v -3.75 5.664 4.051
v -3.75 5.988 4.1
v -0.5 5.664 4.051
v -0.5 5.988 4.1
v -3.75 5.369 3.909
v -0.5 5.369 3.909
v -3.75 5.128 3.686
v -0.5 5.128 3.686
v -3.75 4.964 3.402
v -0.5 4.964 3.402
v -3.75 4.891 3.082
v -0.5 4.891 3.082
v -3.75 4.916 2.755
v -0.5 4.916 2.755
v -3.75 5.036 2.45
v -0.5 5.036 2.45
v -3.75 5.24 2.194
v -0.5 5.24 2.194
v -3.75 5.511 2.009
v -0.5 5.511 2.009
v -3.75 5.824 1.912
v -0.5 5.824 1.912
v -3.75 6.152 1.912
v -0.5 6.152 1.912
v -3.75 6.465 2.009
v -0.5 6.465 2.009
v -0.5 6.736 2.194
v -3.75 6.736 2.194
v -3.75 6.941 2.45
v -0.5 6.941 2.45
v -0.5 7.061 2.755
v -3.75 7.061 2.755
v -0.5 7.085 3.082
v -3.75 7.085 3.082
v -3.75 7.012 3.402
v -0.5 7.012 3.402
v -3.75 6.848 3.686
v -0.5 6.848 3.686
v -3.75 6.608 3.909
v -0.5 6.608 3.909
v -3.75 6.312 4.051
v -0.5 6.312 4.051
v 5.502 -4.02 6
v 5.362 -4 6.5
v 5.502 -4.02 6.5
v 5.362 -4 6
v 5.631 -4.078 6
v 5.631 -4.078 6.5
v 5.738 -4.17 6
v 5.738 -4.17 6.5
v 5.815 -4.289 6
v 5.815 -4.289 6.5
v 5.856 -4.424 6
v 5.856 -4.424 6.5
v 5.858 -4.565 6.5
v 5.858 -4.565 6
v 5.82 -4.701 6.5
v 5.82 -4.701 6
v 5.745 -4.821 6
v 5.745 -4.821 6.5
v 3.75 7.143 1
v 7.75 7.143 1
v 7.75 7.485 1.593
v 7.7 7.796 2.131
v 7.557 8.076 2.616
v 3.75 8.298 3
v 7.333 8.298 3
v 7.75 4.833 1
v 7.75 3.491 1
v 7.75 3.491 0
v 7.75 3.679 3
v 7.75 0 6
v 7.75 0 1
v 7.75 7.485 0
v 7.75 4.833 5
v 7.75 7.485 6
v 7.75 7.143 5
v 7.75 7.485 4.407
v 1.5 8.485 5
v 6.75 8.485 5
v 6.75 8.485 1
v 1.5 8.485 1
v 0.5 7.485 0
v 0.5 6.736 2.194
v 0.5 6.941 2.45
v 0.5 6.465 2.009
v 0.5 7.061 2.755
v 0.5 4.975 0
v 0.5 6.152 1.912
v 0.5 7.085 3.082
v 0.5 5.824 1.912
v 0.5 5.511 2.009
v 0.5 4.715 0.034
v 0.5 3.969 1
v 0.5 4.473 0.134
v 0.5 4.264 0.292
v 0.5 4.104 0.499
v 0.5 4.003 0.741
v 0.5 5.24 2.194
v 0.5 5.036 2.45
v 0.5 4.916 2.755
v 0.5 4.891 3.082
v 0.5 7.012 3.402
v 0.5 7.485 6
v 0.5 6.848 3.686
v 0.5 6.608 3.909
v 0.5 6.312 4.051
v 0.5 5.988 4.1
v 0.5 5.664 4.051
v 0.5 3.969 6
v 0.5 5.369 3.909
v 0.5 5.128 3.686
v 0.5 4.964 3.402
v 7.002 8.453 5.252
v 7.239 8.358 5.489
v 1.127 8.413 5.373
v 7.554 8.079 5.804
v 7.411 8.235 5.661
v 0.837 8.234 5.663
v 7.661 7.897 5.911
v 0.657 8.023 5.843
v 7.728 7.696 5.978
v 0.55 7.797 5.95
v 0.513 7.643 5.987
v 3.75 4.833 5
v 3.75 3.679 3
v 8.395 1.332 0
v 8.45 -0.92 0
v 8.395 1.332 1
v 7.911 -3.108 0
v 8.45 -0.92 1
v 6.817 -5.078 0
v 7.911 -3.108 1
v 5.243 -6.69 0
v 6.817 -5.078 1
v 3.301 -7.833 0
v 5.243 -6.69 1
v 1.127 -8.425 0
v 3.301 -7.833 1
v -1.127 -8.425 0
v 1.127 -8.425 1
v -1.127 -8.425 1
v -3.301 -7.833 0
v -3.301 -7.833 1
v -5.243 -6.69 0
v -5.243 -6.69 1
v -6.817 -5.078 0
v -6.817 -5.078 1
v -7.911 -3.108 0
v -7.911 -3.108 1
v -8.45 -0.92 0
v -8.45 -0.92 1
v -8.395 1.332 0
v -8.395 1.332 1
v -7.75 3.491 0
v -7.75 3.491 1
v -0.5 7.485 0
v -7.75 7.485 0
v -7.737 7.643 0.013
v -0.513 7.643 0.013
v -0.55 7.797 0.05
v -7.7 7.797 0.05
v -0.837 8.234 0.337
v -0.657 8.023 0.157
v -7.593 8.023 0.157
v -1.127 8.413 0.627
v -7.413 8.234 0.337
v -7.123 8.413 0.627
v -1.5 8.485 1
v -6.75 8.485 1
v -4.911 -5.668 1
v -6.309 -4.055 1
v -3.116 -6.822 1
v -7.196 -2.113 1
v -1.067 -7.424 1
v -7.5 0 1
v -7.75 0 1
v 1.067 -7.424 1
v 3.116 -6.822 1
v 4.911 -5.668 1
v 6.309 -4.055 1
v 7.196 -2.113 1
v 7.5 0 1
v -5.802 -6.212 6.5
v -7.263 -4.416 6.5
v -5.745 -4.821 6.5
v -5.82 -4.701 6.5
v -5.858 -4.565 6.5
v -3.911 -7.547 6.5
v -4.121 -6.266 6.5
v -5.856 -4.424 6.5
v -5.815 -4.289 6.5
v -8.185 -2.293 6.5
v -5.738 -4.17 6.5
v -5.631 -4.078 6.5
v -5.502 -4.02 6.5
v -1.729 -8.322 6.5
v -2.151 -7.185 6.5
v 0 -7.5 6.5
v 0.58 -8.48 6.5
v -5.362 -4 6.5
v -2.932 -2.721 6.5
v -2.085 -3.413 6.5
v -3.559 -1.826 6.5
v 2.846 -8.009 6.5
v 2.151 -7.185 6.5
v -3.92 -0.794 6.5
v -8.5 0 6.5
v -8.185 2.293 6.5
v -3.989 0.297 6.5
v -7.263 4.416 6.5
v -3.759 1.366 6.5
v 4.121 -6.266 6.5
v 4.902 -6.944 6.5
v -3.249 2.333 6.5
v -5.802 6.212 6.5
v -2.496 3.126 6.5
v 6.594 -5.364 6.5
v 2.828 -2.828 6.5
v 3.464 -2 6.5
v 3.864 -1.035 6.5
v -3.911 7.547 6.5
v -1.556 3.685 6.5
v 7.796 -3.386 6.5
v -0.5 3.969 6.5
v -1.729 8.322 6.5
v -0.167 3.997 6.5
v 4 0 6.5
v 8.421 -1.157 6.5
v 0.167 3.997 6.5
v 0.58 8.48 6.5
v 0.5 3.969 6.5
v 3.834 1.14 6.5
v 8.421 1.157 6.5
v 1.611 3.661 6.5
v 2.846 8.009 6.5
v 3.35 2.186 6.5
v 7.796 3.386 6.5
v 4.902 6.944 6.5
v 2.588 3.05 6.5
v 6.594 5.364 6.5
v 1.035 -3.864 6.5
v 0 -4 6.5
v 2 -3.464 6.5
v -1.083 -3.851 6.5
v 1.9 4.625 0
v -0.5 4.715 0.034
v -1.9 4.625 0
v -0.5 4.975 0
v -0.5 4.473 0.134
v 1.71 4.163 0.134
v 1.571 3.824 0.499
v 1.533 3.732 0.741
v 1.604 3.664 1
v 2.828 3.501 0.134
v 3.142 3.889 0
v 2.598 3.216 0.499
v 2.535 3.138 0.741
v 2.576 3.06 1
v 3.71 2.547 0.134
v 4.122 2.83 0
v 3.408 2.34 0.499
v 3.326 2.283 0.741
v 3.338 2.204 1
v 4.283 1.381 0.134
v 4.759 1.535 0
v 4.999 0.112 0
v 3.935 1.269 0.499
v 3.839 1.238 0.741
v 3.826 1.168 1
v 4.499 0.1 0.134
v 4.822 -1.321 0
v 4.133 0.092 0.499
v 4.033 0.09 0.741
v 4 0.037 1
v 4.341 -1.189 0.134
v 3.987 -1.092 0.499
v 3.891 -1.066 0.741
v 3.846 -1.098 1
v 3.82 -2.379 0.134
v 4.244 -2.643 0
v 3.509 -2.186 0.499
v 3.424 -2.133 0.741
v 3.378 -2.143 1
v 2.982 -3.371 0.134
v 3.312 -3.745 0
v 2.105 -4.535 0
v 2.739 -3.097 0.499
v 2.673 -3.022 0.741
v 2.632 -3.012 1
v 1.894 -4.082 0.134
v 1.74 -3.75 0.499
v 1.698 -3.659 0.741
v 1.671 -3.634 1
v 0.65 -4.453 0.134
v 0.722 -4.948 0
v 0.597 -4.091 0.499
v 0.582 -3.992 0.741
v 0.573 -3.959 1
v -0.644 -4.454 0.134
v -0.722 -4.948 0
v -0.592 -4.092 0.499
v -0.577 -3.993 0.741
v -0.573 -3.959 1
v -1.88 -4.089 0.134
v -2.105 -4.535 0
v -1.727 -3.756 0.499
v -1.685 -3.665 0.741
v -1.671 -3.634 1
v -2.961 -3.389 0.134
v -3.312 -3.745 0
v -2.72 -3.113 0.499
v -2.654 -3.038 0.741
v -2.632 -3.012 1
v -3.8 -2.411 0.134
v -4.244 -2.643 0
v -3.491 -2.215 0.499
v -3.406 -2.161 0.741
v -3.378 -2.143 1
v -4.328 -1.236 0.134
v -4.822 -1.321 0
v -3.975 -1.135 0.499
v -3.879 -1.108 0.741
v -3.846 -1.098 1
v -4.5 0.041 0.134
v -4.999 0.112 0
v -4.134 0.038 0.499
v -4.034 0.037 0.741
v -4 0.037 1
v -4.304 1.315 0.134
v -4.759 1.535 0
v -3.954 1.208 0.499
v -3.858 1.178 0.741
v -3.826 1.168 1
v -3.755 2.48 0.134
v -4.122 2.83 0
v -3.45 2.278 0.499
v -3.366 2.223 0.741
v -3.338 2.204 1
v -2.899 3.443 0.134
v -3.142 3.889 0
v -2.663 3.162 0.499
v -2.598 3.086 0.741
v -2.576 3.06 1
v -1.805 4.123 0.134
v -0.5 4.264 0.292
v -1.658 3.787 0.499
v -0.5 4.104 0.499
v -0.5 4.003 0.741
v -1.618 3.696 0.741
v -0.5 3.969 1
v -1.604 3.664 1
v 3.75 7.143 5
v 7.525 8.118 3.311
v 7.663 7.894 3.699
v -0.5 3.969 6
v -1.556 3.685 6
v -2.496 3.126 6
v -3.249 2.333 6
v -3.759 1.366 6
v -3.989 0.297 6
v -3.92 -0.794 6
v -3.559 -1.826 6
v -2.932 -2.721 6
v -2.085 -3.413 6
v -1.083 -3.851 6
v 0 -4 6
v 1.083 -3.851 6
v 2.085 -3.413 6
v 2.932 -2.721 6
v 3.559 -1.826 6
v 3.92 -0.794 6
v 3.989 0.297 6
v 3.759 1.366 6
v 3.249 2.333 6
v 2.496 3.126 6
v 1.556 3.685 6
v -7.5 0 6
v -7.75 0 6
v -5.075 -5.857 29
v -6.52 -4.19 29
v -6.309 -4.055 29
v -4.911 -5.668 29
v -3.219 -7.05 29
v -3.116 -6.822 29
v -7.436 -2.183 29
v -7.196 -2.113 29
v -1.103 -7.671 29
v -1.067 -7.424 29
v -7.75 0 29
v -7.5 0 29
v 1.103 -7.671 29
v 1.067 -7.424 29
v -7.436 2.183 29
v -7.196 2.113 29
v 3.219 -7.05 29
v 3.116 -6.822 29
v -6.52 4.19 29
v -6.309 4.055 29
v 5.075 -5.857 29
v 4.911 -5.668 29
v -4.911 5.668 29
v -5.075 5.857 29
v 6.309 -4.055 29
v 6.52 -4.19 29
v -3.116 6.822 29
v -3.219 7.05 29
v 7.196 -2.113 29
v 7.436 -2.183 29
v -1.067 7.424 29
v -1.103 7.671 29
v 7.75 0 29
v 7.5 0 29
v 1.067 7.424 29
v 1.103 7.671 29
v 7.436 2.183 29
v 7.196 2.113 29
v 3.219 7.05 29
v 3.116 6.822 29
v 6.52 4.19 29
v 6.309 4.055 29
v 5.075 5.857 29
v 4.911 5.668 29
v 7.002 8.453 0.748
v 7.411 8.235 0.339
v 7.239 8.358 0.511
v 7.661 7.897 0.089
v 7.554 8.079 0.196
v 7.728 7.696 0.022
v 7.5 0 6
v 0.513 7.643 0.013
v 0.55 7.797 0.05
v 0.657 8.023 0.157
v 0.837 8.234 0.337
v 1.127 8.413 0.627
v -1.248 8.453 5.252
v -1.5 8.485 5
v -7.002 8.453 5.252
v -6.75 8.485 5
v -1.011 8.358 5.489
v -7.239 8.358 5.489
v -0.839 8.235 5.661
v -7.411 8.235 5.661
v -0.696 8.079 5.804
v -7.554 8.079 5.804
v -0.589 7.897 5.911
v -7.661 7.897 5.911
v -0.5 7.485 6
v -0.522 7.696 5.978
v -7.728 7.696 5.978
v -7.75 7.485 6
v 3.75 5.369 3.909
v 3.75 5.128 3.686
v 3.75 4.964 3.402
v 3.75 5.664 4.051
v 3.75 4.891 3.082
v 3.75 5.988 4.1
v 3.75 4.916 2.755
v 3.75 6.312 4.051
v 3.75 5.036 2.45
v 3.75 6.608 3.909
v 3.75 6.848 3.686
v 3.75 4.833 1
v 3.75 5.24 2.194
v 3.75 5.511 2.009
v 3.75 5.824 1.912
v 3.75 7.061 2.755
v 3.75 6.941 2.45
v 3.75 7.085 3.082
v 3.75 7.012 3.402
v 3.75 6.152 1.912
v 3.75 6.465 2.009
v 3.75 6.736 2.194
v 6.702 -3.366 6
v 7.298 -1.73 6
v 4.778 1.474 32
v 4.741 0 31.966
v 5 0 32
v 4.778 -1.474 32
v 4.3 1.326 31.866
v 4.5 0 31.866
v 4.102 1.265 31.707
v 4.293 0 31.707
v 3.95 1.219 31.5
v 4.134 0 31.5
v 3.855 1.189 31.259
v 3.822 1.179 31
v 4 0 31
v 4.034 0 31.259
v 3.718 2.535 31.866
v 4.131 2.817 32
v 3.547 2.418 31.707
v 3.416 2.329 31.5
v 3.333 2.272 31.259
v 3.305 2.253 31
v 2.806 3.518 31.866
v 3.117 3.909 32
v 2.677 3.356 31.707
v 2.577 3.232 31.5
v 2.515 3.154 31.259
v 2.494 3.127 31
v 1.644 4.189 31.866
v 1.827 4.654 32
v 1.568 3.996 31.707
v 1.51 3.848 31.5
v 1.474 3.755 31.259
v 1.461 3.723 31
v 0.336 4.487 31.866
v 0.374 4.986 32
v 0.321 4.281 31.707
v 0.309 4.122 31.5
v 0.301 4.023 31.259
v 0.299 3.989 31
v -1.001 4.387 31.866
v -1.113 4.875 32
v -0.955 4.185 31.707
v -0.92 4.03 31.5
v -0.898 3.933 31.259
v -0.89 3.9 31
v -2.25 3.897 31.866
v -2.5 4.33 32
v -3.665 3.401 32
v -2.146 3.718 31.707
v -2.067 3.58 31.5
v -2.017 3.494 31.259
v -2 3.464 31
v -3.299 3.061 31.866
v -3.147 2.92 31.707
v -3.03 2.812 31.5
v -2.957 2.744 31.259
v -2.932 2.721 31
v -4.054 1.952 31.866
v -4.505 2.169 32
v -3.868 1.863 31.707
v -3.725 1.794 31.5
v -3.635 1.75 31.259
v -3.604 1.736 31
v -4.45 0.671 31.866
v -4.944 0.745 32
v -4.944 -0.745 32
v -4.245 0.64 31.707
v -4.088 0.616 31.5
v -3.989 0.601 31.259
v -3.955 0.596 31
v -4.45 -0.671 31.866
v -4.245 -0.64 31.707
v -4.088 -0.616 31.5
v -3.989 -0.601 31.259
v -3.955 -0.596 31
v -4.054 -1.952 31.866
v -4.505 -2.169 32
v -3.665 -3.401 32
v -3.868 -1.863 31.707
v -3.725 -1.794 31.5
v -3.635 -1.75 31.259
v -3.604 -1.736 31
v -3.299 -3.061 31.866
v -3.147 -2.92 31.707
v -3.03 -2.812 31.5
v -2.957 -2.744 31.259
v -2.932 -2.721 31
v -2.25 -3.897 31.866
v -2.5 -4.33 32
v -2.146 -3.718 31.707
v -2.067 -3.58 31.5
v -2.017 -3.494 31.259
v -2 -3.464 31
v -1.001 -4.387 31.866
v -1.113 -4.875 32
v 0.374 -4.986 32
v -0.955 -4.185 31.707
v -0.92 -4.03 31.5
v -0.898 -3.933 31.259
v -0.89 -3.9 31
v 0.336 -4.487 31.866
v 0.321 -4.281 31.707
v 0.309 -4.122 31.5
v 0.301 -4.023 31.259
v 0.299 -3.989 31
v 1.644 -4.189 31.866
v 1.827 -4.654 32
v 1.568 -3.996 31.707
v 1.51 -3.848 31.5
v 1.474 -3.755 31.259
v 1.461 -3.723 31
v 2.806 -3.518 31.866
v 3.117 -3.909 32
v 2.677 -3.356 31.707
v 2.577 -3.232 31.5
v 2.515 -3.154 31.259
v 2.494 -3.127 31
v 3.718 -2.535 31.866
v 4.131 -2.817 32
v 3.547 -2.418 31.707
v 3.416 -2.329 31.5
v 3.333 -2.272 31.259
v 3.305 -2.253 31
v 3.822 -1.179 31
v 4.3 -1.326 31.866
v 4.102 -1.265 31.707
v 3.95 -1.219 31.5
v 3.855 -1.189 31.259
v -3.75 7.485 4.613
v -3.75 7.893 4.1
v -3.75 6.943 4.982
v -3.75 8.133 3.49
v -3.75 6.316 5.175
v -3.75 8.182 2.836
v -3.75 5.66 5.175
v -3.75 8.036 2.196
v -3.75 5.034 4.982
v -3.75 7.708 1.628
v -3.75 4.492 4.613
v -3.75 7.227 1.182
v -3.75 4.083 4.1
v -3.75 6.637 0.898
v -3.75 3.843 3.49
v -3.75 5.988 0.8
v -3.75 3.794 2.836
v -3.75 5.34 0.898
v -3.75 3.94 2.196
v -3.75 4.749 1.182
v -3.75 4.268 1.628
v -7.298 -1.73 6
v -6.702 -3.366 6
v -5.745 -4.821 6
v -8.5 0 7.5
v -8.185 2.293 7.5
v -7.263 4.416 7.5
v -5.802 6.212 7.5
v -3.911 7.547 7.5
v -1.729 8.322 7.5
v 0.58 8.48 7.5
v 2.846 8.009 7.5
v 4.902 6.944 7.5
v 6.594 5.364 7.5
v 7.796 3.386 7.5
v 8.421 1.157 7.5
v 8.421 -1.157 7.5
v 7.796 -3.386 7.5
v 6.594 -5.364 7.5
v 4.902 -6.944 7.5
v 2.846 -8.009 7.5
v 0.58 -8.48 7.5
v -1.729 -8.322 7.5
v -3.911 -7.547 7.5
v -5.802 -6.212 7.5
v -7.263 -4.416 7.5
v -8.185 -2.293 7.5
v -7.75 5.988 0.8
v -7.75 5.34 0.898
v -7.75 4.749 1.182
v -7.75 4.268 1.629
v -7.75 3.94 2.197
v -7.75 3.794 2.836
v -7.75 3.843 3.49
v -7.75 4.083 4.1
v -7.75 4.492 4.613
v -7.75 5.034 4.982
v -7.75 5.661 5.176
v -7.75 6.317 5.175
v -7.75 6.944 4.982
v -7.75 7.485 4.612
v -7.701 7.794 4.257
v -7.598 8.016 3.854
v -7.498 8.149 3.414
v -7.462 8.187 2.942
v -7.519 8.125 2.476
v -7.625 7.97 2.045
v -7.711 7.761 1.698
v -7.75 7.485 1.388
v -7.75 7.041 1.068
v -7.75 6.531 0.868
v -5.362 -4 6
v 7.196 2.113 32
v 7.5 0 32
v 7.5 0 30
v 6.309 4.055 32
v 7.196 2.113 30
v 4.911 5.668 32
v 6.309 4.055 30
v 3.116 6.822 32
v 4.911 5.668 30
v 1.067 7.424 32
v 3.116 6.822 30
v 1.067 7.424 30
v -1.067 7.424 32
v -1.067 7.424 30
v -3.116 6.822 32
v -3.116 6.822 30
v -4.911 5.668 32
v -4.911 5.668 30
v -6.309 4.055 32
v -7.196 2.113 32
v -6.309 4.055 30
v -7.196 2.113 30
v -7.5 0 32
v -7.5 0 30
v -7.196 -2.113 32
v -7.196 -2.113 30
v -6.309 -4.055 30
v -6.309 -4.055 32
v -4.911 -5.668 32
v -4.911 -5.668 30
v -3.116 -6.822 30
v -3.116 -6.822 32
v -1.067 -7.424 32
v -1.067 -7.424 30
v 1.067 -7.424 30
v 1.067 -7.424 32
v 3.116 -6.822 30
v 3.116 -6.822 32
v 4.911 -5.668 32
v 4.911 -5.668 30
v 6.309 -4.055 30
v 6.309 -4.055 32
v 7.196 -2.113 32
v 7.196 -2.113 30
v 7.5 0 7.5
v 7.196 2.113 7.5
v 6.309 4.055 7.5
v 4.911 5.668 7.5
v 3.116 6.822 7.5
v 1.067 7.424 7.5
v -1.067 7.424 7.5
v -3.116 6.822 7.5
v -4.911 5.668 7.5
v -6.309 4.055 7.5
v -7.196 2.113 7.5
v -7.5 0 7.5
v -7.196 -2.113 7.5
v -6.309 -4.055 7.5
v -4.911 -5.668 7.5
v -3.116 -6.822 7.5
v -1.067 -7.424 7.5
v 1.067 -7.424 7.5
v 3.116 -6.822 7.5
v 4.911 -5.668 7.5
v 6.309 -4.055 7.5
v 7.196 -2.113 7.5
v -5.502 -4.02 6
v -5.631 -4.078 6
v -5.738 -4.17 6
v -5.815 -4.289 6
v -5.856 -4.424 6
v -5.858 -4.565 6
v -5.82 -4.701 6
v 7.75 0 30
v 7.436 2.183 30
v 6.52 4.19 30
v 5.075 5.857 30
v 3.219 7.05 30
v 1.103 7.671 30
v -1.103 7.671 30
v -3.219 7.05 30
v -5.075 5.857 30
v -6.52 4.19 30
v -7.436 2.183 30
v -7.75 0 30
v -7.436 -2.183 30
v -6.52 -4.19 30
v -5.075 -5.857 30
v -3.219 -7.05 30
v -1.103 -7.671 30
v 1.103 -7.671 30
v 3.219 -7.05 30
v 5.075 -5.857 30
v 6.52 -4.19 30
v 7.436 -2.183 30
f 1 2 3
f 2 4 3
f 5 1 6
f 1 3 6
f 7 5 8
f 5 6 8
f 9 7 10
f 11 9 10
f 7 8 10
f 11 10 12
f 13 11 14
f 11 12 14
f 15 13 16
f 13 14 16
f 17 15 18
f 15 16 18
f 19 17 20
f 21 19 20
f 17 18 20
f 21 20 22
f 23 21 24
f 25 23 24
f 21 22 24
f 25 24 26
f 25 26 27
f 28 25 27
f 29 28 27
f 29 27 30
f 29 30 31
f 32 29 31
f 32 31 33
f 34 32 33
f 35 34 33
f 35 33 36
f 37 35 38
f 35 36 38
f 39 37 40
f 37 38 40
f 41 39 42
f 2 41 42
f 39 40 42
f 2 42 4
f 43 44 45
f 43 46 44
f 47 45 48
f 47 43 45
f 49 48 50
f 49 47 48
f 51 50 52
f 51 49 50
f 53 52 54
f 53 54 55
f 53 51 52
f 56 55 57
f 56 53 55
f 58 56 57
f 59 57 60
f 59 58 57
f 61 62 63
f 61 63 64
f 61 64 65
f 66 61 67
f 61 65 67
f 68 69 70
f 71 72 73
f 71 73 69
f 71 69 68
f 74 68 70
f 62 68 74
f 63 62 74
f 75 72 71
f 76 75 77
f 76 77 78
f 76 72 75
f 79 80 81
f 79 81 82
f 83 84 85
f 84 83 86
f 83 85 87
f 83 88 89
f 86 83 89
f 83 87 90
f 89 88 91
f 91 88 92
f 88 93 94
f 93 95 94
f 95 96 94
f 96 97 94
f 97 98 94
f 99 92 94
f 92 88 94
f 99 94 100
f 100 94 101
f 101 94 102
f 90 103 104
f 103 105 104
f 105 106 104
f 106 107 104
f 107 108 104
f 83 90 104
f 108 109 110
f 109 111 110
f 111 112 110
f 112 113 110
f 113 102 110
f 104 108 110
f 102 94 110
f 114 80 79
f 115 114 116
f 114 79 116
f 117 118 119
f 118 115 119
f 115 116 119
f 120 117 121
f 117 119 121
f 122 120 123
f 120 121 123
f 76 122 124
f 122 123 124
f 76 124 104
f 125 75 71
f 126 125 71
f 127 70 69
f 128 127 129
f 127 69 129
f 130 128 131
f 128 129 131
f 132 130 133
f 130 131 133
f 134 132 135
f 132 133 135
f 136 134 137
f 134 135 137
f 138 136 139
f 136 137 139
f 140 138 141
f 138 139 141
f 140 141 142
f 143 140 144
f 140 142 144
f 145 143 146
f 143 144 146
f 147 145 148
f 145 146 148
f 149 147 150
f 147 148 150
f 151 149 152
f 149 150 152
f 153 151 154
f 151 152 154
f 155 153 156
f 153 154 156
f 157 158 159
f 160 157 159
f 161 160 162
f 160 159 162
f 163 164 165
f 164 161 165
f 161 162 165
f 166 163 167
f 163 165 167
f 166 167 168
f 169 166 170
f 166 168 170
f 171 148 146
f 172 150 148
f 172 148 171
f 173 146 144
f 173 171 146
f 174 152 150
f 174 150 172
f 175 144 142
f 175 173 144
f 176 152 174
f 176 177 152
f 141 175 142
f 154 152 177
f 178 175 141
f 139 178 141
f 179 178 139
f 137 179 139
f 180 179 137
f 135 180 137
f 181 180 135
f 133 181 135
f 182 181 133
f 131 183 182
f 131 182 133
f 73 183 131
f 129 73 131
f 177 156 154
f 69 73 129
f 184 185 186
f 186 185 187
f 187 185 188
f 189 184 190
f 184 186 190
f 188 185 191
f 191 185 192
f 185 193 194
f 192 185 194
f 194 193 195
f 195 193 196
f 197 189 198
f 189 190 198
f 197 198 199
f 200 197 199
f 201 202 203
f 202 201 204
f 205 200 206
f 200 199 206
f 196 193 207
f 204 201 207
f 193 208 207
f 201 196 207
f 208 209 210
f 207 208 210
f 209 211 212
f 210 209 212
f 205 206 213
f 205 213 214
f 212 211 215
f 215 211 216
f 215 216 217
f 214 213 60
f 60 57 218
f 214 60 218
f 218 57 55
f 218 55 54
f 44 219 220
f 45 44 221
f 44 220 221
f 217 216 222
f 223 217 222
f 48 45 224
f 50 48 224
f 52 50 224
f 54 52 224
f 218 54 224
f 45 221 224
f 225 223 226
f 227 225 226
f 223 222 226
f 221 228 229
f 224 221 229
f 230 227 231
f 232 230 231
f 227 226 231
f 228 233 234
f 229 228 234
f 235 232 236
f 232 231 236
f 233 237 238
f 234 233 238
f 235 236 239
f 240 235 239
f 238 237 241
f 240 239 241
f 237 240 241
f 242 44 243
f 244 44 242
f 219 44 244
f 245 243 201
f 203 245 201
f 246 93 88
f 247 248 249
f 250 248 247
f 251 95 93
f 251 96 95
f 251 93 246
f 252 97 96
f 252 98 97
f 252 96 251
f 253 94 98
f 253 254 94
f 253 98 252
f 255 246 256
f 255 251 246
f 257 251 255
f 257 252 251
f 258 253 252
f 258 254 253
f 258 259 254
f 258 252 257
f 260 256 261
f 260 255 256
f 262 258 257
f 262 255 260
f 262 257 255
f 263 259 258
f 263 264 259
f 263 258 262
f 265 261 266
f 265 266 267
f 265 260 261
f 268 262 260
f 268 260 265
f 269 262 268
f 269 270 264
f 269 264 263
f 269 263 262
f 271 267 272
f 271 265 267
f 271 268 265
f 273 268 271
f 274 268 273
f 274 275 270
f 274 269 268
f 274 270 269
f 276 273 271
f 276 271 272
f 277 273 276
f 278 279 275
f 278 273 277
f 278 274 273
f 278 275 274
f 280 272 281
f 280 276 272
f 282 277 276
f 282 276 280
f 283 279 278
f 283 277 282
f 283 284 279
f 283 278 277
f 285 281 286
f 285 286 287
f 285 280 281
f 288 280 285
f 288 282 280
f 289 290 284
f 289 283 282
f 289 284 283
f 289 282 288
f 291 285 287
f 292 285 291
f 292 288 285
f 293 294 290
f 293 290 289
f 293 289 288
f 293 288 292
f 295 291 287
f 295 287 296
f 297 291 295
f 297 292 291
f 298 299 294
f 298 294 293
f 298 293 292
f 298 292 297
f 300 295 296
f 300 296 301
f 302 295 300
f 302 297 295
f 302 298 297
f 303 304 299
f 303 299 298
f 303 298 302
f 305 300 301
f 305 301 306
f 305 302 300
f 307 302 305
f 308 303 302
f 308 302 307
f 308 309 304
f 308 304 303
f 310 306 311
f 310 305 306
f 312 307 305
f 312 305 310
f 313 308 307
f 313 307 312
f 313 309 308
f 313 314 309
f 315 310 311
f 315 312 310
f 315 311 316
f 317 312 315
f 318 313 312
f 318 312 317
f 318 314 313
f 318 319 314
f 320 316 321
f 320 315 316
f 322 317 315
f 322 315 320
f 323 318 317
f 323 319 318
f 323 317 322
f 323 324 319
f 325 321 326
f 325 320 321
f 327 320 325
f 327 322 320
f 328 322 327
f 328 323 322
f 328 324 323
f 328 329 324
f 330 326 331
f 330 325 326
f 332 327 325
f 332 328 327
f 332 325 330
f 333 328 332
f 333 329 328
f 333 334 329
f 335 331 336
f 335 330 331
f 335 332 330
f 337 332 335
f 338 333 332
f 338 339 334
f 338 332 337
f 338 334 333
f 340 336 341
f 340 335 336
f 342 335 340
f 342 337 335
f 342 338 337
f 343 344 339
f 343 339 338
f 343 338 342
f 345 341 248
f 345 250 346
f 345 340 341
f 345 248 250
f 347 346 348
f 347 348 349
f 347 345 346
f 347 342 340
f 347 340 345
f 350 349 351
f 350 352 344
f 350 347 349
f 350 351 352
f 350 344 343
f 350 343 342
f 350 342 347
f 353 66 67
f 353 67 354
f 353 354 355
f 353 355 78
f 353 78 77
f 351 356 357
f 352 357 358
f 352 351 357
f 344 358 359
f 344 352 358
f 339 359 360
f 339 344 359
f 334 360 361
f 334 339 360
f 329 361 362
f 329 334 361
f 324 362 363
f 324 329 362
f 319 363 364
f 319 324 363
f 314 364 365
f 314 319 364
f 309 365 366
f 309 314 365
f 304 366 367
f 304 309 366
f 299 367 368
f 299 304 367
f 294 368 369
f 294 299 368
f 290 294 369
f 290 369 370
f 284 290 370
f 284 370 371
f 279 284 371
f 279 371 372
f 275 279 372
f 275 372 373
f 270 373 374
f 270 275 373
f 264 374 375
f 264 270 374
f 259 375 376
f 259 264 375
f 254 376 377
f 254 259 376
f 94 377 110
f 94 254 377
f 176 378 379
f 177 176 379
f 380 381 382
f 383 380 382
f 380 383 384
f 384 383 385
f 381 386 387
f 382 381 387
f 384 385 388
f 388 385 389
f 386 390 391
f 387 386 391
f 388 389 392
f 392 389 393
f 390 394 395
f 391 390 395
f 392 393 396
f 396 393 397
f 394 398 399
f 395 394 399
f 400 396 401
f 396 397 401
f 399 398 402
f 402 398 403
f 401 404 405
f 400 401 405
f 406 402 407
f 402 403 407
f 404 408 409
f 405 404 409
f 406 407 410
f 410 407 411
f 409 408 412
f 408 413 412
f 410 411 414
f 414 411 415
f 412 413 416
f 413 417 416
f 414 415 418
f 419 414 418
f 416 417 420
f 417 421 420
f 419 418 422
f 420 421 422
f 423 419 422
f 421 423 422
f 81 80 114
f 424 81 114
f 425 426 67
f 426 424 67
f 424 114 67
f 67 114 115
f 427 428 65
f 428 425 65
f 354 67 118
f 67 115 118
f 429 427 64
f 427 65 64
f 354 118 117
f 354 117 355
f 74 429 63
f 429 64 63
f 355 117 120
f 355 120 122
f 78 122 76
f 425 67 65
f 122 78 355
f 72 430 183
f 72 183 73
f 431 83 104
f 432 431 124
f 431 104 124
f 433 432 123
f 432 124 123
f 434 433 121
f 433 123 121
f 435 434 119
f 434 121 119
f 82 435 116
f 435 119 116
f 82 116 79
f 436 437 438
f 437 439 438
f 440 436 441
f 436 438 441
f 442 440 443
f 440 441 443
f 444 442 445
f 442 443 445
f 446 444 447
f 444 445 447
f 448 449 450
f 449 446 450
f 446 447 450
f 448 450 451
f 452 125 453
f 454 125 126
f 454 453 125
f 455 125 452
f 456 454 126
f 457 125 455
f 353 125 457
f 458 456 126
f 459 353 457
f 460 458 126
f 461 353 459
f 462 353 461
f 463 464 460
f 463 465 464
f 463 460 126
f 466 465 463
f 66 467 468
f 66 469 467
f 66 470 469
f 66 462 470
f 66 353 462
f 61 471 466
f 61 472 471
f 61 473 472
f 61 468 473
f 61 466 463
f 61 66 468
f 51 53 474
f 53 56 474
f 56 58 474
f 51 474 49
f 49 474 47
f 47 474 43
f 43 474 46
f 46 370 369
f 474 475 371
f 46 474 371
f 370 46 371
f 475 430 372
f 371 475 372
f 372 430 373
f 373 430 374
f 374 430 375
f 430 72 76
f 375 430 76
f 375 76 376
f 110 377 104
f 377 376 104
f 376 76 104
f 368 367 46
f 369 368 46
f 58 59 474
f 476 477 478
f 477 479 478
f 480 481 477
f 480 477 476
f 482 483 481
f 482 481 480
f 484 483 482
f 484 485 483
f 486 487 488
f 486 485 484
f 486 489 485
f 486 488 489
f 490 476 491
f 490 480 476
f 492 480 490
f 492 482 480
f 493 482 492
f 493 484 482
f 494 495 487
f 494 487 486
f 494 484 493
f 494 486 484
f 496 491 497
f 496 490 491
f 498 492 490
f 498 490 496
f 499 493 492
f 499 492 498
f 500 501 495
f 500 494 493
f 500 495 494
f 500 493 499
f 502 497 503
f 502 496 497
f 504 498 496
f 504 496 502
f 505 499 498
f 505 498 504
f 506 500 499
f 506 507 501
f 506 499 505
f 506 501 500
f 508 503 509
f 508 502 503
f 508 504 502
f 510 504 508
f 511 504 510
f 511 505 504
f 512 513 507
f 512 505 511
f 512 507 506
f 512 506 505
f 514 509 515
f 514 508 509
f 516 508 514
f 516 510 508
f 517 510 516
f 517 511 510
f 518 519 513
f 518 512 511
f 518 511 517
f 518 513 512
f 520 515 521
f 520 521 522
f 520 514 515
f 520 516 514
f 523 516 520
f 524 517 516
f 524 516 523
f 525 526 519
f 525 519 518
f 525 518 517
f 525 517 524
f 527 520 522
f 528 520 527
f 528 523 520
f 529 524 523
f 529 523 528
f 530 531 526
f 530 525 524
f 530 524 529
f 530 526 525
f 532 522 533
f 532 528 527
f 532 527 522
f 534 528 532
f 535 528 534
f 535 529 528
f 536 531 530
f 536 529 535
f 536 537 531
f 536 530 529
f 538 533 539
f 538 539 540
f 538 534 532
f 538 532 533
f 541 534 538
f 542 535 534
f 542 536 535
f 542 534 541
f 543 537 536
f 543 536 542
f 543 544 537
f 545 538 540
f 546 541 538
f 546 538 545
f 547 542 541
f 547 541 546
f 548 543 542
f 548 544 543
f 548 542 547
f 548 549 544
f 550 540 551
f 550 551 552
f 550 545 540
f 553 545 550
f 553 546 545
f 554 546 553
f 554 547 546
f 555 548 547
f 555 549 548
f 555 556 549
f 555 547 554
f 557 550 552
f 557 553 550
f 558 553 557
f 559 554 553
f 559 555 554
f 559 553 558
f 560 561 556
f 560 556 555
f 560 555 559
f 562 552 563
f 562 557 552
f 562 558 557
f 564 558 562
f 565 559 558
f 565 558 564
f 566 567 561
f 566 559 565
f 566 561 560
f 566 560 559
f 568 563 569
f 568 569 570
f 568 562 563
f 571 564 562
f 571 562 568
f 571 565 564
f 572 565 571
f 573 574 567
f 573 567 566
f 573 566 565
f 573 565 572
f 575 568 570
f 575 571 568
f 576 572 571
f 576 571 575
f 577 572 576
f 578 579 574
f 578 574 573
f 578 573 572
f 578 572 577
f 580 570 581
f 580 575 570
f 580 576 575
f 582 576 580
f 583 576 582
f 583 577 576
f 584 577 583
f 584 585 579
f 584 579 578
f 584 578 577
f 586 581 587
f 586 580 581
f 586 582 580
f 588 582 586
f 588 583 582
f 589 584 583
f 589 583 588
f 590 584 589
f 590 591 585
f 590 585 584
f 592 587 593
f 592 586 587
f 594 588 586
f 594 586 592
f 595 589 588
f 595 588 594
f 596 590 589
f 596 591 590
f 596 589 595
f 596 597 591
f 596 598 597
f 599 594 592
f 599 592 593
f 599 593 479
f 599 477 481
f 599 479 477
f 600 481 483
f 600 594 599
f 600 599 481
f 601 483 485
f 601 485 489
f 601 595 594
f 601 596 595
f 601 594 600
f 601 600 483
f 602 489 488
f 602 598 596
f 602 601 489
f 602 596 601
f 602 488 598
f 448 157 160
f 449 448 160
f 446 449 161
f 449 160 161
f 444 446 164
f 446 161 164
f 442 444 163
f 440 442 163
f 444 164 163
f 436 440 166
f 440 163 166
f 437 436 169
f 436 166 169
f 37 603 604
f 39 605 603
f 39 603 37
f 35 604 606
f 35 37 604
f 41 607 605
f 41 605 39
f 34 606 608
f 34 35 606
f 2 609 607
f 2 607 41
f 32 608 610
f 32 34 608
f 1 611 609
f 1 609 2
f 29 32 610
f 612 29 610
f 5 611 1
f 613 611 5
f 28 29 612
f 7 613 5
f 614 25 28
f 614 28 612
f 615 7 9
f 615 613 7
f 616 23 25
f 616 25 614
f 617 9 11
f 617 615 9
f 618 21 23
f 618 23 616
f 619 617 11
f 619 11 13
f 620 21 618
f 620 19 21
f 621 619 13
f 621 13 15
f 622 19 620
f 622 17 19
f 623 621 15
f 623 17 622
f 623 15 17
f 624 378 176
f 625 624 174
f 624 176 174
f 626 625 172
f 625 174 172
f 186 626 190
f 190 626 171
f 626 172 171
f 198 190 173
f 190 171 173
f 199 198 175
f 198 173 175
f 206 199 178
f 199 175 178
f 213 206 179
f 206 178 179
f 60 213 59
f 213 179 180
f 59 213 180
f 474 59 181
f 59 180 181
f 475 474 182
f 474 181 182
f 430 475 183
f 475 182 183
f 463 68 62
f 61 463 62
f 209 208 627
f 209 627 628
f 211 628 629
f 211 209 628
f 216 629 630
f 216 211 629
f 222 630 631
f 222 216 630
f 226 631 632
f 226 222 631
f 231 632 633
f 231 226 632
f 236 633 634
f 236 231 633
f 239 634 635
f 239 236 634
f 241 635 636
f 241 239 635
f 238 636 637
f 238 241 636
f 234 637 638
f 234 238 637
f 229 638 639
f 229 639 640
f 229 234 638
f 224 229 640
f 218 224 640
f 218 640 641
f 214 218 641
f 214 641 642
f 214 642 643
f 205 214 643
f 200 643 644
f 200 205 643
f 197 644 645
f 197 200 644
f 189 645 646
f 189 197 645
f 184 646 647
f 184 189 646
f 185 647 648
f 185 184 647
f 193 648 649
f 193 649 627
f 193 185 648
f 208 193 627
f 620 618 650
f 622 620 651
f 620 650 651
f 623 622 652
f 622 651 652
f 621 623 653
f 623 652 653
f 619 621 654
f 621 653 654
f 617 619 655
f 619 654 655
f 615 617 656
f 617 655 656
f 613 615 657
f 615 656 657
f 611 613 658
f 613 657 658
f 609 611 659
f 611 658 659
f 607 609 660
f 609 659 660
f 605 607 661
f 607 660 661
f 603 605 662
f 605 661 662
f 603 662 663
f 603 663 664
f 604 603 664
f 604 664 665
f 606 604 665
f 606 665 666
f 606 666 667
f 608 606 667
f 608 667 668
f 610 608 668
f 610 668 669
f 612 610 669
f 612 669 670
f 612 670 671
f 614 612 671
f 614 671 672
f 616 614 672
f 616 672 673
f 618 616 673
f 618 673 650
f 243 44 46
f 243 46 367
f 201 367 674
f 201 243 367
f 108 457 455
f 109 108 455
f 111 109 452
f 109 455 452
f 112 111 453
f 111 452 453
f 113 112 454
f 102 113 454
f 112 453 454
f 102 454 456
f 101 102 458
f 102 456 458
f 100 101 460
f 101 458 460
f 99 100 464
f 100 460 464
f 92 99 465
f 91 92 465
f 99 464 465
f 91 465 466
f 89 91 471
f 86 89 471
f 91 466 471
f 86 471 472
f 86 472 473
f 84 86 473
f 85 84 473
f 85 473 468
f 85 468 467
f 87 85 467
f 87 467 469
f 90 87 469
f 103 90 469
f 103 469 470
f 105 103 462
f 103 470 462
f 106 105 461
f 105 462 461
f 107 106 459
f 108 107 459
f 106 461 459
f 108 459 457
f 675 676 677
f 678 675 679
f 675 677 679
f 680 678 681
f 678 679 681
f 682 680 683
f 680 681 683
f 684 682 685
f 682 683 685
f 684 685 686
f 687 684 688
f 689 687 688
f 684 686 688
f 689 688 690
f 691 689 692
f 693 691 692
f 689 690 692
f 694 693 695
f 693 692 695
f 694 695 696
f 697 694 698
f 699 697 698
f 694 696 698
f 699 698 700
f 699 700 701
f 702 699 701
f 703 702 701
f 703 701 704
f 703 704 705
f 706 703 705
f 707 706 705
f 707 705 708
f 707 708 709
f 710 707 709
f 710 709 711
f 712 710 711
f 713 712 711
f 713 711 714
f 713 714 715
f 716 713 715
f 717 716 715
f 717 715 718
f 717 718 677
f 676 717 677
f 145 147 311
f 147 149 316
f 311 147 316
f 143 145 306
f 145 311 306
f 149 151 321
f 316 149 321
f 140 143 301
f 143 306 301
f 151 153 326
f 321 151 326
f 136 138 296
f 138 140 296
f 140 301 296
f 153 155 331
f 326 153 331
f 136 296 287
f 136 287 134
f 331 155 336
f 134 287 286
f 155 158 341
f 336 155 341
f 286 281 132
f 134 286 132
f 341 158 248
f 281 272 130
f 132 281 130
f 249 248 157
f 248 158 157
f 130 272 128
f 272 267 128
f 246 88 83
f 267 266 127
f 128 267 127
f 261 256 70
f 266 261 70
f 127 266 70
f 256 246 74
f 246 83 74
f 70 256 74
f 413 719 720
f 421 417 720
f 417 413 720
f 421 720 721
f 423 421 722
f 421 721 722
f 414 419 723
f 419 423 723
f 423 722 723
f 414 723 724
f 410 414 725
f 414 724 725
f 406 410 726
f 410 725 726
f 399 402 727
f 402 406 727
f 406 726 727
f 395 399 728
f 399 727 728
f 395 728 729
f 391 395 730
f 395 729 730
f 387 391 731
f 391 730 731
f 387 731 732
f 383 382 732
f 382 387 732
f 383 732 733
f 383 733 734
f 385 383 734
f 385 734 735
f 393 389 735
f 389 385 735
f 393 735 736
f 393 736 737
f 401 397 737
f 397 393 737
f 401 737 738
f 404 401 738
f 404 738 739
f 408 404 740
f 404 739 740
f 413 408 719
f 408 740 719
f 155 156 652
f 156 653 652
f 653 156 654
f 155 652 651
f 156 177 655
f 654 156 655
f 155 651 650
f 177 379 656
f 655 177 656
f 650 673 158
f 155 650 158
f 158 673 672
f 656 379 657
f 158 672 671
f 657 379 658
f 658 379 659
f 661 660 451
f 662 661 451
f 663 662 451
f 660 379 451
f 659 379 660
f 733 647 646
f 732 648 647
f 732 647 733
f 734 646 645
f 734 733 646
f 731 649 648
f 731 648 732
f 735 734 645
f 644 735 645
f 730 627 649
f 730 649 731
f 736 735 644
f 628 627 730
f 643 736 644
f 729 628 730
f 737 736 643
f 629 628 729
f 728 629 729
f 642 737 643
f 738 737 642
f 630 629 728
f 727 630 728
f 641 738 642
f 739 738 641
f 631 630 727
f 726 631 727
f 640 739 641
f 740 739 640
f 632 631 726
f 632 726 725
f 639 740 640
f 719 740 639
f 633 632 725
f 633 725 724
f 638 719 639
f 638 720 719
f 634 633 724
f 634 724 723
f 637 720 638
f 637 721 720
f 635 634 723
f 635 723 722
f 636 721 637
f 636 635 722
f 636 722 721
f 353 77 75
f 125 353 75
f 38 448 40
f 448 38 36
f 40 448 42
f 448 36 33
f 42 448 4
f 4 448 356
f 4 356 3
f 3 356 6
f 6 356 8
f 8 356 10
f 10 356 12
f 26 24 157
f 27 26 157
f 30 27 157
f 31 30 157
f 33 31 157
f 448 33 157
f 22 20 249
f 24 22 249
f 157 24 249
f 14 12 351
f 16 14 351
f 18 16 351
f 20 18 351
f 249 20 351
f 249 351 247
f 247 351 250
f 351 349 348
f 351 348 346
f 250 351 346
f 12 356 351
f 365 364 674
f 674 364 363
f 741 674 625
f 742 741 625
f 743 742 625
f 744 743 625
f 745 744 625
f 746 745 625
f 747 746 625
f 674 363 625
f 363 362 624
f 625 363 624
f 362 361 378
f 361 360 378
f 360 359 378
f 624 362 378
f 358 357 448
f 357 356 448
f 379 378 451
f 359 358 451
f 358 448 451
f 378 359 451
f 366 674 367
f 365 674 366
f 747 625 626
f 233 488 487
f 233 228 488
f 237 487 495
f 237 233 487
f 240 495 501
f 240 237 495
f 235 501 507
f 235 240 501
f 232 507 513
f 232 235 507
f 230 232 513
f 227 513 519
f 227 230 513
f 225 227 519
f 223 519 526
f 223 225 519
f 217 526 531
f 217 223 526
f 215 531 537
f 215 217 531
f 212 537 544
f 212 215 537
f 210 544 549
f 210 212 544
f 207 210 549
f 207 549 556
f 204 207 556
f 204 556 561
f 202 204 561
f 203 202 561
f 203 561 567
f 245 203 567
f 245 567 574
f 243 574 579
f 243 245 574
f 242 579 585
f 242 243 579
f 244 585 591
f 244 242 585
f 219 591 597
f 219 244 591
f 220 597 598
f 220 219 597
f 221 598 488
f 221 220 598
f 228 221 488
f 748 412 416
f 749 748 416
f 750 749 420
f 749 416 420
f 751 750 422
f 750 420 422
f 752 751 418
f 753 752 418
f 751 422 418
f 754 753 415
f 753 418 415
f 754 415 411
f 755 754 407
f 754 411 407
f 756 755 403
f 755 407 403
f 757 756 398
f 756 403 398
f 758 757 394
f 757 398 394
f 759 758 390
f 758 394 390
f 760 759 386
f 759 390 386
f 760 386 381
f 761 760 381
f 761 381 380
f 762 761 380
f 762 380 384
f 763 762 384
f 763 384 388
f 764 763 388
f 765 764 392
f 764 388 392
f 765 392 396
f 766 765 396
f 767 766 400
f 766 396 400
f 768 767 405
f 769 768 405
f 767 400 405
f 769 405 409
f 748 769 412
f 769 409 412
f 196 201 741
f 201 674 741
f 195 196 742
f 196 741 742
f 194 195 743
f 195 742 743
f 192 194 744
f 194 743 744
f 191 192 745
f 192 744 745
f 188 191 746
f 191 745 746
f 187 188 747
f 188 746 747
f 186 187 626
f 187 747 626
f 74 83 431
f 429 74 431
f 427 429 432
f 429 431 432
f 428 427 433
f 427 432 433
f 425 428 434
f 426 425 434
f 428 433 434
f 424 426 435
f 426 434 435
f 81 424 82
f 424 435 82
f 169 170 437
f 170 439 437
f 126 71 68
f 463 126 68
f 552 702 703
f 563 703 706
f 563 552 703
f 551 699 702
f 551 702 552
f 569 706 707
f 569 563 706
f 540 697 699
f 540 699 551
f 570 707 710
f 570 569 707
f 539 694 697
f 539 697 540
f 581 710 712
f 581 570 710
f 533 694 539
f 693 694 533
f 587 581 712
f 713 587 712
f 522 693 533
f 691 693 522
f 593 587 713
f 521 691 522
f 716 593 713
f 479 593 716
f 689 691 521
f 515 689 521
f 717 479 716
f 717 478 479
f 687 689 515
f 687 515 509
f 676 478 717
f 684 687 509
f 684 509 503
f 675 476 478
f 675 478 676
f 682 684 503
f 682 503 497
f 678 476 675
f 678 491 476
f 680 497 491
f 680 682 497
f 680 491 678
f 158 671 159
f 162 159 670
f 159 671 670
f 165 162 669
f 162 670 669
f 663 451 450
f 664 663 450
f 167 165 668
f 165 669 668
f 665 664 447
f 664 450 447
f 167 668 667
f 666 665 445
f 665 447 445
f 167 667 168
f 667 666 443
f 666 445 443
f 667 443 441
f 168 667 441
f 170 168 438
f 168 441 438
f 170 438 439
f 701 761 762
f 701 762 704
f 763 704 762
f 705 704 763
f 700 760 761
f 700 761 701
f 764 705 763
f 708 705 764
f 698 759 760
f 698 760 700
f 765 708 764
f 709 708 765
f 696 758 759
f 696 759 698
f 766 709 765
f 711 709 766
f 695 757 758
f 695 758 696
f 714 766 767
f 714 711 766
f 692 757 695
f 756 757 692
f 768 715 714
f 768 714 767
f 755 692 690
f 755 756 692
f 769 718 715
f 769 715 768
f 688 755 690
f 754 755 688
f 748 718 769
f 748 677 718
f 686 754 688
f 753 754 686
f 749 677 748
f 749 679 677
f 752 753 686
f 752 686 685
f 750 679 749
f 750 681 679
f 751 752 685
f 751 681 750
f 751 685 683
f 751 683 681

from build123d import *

# Parameters (mm, degrees)
SKETCH1_R                      = 7.5
SKETCH1_R_2                    = 4
BOSS_EXTRUDE1_DEPTH            = 32
SKETCH6_W                      = 1
SKETCH6_H                      = 1
SKETCH7_W                      = 1
SKETCH7_H                      = 1
CUT_EXTRUDE1_DEPTH             = 35.18332927
BOSS_EXTRUDE3_DEPTH            = 6.5
SKETCH15_W                     = 15.5
SKETCH15_H                     = 12.485281374
CUT_EXTRUDE2_DEPTH             = 0.5
CBORE_FOR_M2_SHCS1_D           = 2.2
CBORE_FOR_M2_SHCS1_CBORE_D     = 4.4
CBORE_FOR_M2_SHCS1_CBORE_DEPTH = 4
FILLET4_R                      = 0.5
SKETCH4_R                      = 7.75
SKETCH4_R_2                    = 4
BOSS_EXTRUDE4_DEPTH            = 1
CUT_EXTRUDE3_DEPTH             = 4
FILLET5_R                      = 1


with BuildPart() as part:
    # Sketch1 → Boss-Extrude1 (new body)
    with BuildSketch(Plane.XY):
        Circle(SKETCH1_R)
        Circle(SKETCH1_R_2, mode=Mode.SUBTRACT)
    extrude(amount=BOSS_EXTRUDE1_DEPTH)

    # Sketch6 → Revolve1 (revolve)
    with BuildSketch(Plane(origin=(0, 0, 0), x_dir=(-1, 0, 0), z_dir=(0, 1, 0))):
        with Locations((8, 0.5)):
            Rectangle(SKETCH6_W, SKETCH6_H)
    revolve(axis=Axis((0, 0, 32), (0, 0, -1)))

    # Sketch7 → Revolve2 (revolve)
    with BuildSketch(Plane(origin=(0, 0, 0), x_dir=(0, 0, -1), z_dir=(1, 0, 0)), mode=Mode.PRIVATE) as revolve2_sk:
        with Locations((-7, 8)):
            Rectangle(SKETCH7_W, SKETCH7_H)
    revolve(revolve2_sk.sketch.rotate(Axis((0, 0, 32), (0, 0, -1)), 270), axis=Axis((0, 0, 32), (0, 0, -1)))

    # Sketch9 → Cut-Extrude1 (cut, through all)
    with BuildSketch(Plane(origin=(0, 0, 0), x_dir=(-1, 0, 0), z_dir=(0, 1, 0))):
        Polygon((0, 0), (-0.5, 0), (-0.5, 6.5), (0.5, 6.5), (0.5, 0), align=None)
    extrude(amount=CUT_EXTRUDE1_DEPTH, mode=Mode.SUBTRACT)

    # Sketch12 → Boss-Extrude3 (add)
    with BuildSketch(Plane(origin=(0, 0, 6.5), x_dir=(-1, 0, 0), z_dir=(0, 0, -1))):
        with BuildLine():
            Line((4, 0), (7.75, 0))
            Line((7.75, 0), (7.75, 8.485281374))
            Line((7.75, 8.485281374), (0.5, 8.485281374))
            Line((0.5, 8.485281374), (0.5, 3.968626967))
            ThreePointArc((0.5, 3.968626967), (3, 2.645751311), (4, 0))
        make_face()
        with BuildLine():
            Line((-7.75, 0), (-7.75, 8.485281374))
            Line((-7.75, 8.485281374), (-0.5, 8.485281374))
            Line((-0.5, 8.485281374), (-0.5, 3.968626967))
            ThreePointArc((-0.5, 3.968626967), (-3, 2.645751311), (-4, 0))
            Line((-4, 0), (-7.75, 0))
        make_face()
    extrude(amount=BOSS_EXTRUDE3_DEPTH)

    # Sketch15 → Cut-Extrude2 (cut)
    with BuildSketch(Plane(origin=(0, 0, 6.5), x_dir=(-1, 0, 0), z_dir=(0, 0, -1))):
        with Locations((0, 2.242640687)):
            Rectangle(SKETCH15_W, SKETCH15_H)
    extrude(amount=CUT_EXTRUDE2_DEPTH, mode=Mode.SUBTRACT)

    # CBORE for M2 SHCS1 (through all)
    with Locations(Plane(origin=(-7.75, 5.988170693, 3), x_dir=(0, 0, -1), z_dir=(-1, 0, 0))):
        with Locations((0, 0)):
            CounterBoreHole(CBORE_FOR_M2_SHCS1_D / 2, CBORE_FOR_M2_SHCS1_CBORE_D / 2, CBORE_FOR_M2_SHCS1_CBORE_DEPTH)

    # Fillet4
    fillet4_edges = [part.edges().sort_by_distance(p)[0] for p in [
        (-6.34428877, -4, 6.25),
        (6.34428877, -4, 6.25),
    ]]
    fillet(fillet4_edges, radius=FILLET4_R)

    # Sketch4 → Boss-Extrude4 (add)
    with BuildSketch(Plane.XY.offset(29)):
        Circle(SKETCH4_R)
        with Locations(Location((0, 0, 0), (0, 0, 270))):
            Circle(SKETCH4_R_2, mode=Mode.SUBTRACT)
    extrude(amount=BOSS_EXTRUDE4_DEPTH)

    # Sketch16 → Cut-Extrude3 (cut)
    with BuildSketch(Plane(origin=(7.75, 0, 0), x_dir=(0, 0, -1), z_dir=(1, 0, 0))):
        Polygon((-3, 8.297571769), (-5, 7.142871231), (-5, 4.833470154), (-3, 3.678769616), (-1, 4.833470154), (-1, 7.142871231), align=None)
    extrude(amount=-CUT_EXTRUDE3_DEPTH, mode=Mode.SUBTRACT)

    # Fillet5
    # the kernel refuses this fillet: 1 mm, written as the material it takes off along each edge
    with BuildSketch(Plane(origin=(0.5, 8.485281374, 6), x_dir=(0, -1, 0), z_dir=(0, 0, -1))) as fillet5_piece_1:
        with BuildLine():
            CenterArc((FILLET5_R, -FILLET5_R), FILLET5_R, 90, 90)
            Line((0, -FILLET5_R), (0, 0))
            Line((0, 0), (FILLET5_R, 0))
        make_face()
    extrude(amount=8.5, mode=Mode.SUBTRACT)
    with BuildSketch(Plane(origin=(-2, 8.485281374, 6), x_dir=(0, -1, 0), z_dir=(1, 0, 0)), Plane(origin=(-10.25, 8.485281374, 6), x_dir=(0, -1, 0), z_dir=(1, 0, 0)), Plane(origin=(-10.25, 8.485281374, 0), x_dir=(0, 0, 1), z_dir=(1, 0, 0))) as fillet5_piece_2:
        with BuildLine():
            CenterArc((FILLET5_R, FILLET5_R), FILLET5_R, 180, 90)
            Line((0, FILLET5_R), (0, 0))
            Line((0, 0), (FILLET5_R, 0))
        make_face()
    extrude(amount=12.25, mode=Mode.SUBTRACT)
    with BuildSketch(Plane(origin=(0, 0, 0), x_dir=(0.0031415874858760906, 0.9999950652018582, 0), z_dir=(-0.9999950652018582, 0.0031415874858760906, 0))) as fillet5_piece_3:
        with BuildLine():
            CenterArc((4 + FILLET5_R, -FILLET5_R), FILLET5_R, 90, 90)
            Line((4 + FILLET5_R, 0), (4, 0))
            Line((4, 0), (4, -FILLET5_R))
        make_face()
    revolve(axis=Axis((0, 0, 0), (0, 0, -1)), revolution_arc=359.64, mode=Mode.SUBTRACT)
    with BuildSketch(Plane(origin=(-0.5, 8.485281374, -2.5), x_dir=(-1, 0, 0), z_dir=(0, 0, 1))) as fillet5_piece_4:
        with BuildLine():
            CenterArc((FILLET5_R, FILLET5_R), FILLET5_R, 180, 90)
            Line((0, FILLET5_R), (0, 0))
            Line((0, 0), (FILLET5_R, 0))
        make_face()
    extrude(amount=8.5, mode=Mode.SUBTRACT)
    with BuildSketch(Plane(origin=(0, 0, 32), x_dir=(1, 0, 0), z_dir=(0, -1, 0))) as fillet5_piece_5:
        with BuildLine():
            CenterArc((4 + FILLET5_R, -FILLET5_R), FILLET5_R, 90, 90)
            Line((4 + FILLET5_R, 0), (4, 0))
            Line((4, 0), (4, -FILLET5_R))
        make_face()
    revolve(axis=Axis((0, 0, 32), (0, 0, 1)), mode=Mode.SUBTRACT)
    with BuildSketch(Plane(origin=(-7.75, 8.485281374, 8.5), x_dir=(0, -1, 0), z_dir=(0, 0, -1)), Plane(origin=(7.75, 8.485281374, 8.5), x_dir=(-1, 0, 0), z_dir=(0, 0, -1))) as fillet5_piece_6:
        with BuildLine():
            CenterArc((FILLET5_R, -FILLET5_R), FILLET5_R, 90, 90)
            Line((0, -FILLET5_R), (0, 0))
            Line((0, 0), (FILLET5_R, 0))
        make_face()
    extrude(amount=11, mode=Mode.SUBTRACT)
    with BuildSketch(Plane(origin=(10.25, 8.485281374, 0), x_dir=(0, 0, 1), z_dir=(-1, 0, 0))) as fillet5_piece_7:
        with BuildLine():
            CenterArc((FILLET5_R, -FILLET5_R), FILLET5_R, 90, 90)
            Line((0, -FILLET5_R), (0, 0))
            Line((0, 0), (FILLET5_R, 0))
        make_face()
    extrude(amount=12.25, mode=Mode.SUBTRACT)


solid = part.part
